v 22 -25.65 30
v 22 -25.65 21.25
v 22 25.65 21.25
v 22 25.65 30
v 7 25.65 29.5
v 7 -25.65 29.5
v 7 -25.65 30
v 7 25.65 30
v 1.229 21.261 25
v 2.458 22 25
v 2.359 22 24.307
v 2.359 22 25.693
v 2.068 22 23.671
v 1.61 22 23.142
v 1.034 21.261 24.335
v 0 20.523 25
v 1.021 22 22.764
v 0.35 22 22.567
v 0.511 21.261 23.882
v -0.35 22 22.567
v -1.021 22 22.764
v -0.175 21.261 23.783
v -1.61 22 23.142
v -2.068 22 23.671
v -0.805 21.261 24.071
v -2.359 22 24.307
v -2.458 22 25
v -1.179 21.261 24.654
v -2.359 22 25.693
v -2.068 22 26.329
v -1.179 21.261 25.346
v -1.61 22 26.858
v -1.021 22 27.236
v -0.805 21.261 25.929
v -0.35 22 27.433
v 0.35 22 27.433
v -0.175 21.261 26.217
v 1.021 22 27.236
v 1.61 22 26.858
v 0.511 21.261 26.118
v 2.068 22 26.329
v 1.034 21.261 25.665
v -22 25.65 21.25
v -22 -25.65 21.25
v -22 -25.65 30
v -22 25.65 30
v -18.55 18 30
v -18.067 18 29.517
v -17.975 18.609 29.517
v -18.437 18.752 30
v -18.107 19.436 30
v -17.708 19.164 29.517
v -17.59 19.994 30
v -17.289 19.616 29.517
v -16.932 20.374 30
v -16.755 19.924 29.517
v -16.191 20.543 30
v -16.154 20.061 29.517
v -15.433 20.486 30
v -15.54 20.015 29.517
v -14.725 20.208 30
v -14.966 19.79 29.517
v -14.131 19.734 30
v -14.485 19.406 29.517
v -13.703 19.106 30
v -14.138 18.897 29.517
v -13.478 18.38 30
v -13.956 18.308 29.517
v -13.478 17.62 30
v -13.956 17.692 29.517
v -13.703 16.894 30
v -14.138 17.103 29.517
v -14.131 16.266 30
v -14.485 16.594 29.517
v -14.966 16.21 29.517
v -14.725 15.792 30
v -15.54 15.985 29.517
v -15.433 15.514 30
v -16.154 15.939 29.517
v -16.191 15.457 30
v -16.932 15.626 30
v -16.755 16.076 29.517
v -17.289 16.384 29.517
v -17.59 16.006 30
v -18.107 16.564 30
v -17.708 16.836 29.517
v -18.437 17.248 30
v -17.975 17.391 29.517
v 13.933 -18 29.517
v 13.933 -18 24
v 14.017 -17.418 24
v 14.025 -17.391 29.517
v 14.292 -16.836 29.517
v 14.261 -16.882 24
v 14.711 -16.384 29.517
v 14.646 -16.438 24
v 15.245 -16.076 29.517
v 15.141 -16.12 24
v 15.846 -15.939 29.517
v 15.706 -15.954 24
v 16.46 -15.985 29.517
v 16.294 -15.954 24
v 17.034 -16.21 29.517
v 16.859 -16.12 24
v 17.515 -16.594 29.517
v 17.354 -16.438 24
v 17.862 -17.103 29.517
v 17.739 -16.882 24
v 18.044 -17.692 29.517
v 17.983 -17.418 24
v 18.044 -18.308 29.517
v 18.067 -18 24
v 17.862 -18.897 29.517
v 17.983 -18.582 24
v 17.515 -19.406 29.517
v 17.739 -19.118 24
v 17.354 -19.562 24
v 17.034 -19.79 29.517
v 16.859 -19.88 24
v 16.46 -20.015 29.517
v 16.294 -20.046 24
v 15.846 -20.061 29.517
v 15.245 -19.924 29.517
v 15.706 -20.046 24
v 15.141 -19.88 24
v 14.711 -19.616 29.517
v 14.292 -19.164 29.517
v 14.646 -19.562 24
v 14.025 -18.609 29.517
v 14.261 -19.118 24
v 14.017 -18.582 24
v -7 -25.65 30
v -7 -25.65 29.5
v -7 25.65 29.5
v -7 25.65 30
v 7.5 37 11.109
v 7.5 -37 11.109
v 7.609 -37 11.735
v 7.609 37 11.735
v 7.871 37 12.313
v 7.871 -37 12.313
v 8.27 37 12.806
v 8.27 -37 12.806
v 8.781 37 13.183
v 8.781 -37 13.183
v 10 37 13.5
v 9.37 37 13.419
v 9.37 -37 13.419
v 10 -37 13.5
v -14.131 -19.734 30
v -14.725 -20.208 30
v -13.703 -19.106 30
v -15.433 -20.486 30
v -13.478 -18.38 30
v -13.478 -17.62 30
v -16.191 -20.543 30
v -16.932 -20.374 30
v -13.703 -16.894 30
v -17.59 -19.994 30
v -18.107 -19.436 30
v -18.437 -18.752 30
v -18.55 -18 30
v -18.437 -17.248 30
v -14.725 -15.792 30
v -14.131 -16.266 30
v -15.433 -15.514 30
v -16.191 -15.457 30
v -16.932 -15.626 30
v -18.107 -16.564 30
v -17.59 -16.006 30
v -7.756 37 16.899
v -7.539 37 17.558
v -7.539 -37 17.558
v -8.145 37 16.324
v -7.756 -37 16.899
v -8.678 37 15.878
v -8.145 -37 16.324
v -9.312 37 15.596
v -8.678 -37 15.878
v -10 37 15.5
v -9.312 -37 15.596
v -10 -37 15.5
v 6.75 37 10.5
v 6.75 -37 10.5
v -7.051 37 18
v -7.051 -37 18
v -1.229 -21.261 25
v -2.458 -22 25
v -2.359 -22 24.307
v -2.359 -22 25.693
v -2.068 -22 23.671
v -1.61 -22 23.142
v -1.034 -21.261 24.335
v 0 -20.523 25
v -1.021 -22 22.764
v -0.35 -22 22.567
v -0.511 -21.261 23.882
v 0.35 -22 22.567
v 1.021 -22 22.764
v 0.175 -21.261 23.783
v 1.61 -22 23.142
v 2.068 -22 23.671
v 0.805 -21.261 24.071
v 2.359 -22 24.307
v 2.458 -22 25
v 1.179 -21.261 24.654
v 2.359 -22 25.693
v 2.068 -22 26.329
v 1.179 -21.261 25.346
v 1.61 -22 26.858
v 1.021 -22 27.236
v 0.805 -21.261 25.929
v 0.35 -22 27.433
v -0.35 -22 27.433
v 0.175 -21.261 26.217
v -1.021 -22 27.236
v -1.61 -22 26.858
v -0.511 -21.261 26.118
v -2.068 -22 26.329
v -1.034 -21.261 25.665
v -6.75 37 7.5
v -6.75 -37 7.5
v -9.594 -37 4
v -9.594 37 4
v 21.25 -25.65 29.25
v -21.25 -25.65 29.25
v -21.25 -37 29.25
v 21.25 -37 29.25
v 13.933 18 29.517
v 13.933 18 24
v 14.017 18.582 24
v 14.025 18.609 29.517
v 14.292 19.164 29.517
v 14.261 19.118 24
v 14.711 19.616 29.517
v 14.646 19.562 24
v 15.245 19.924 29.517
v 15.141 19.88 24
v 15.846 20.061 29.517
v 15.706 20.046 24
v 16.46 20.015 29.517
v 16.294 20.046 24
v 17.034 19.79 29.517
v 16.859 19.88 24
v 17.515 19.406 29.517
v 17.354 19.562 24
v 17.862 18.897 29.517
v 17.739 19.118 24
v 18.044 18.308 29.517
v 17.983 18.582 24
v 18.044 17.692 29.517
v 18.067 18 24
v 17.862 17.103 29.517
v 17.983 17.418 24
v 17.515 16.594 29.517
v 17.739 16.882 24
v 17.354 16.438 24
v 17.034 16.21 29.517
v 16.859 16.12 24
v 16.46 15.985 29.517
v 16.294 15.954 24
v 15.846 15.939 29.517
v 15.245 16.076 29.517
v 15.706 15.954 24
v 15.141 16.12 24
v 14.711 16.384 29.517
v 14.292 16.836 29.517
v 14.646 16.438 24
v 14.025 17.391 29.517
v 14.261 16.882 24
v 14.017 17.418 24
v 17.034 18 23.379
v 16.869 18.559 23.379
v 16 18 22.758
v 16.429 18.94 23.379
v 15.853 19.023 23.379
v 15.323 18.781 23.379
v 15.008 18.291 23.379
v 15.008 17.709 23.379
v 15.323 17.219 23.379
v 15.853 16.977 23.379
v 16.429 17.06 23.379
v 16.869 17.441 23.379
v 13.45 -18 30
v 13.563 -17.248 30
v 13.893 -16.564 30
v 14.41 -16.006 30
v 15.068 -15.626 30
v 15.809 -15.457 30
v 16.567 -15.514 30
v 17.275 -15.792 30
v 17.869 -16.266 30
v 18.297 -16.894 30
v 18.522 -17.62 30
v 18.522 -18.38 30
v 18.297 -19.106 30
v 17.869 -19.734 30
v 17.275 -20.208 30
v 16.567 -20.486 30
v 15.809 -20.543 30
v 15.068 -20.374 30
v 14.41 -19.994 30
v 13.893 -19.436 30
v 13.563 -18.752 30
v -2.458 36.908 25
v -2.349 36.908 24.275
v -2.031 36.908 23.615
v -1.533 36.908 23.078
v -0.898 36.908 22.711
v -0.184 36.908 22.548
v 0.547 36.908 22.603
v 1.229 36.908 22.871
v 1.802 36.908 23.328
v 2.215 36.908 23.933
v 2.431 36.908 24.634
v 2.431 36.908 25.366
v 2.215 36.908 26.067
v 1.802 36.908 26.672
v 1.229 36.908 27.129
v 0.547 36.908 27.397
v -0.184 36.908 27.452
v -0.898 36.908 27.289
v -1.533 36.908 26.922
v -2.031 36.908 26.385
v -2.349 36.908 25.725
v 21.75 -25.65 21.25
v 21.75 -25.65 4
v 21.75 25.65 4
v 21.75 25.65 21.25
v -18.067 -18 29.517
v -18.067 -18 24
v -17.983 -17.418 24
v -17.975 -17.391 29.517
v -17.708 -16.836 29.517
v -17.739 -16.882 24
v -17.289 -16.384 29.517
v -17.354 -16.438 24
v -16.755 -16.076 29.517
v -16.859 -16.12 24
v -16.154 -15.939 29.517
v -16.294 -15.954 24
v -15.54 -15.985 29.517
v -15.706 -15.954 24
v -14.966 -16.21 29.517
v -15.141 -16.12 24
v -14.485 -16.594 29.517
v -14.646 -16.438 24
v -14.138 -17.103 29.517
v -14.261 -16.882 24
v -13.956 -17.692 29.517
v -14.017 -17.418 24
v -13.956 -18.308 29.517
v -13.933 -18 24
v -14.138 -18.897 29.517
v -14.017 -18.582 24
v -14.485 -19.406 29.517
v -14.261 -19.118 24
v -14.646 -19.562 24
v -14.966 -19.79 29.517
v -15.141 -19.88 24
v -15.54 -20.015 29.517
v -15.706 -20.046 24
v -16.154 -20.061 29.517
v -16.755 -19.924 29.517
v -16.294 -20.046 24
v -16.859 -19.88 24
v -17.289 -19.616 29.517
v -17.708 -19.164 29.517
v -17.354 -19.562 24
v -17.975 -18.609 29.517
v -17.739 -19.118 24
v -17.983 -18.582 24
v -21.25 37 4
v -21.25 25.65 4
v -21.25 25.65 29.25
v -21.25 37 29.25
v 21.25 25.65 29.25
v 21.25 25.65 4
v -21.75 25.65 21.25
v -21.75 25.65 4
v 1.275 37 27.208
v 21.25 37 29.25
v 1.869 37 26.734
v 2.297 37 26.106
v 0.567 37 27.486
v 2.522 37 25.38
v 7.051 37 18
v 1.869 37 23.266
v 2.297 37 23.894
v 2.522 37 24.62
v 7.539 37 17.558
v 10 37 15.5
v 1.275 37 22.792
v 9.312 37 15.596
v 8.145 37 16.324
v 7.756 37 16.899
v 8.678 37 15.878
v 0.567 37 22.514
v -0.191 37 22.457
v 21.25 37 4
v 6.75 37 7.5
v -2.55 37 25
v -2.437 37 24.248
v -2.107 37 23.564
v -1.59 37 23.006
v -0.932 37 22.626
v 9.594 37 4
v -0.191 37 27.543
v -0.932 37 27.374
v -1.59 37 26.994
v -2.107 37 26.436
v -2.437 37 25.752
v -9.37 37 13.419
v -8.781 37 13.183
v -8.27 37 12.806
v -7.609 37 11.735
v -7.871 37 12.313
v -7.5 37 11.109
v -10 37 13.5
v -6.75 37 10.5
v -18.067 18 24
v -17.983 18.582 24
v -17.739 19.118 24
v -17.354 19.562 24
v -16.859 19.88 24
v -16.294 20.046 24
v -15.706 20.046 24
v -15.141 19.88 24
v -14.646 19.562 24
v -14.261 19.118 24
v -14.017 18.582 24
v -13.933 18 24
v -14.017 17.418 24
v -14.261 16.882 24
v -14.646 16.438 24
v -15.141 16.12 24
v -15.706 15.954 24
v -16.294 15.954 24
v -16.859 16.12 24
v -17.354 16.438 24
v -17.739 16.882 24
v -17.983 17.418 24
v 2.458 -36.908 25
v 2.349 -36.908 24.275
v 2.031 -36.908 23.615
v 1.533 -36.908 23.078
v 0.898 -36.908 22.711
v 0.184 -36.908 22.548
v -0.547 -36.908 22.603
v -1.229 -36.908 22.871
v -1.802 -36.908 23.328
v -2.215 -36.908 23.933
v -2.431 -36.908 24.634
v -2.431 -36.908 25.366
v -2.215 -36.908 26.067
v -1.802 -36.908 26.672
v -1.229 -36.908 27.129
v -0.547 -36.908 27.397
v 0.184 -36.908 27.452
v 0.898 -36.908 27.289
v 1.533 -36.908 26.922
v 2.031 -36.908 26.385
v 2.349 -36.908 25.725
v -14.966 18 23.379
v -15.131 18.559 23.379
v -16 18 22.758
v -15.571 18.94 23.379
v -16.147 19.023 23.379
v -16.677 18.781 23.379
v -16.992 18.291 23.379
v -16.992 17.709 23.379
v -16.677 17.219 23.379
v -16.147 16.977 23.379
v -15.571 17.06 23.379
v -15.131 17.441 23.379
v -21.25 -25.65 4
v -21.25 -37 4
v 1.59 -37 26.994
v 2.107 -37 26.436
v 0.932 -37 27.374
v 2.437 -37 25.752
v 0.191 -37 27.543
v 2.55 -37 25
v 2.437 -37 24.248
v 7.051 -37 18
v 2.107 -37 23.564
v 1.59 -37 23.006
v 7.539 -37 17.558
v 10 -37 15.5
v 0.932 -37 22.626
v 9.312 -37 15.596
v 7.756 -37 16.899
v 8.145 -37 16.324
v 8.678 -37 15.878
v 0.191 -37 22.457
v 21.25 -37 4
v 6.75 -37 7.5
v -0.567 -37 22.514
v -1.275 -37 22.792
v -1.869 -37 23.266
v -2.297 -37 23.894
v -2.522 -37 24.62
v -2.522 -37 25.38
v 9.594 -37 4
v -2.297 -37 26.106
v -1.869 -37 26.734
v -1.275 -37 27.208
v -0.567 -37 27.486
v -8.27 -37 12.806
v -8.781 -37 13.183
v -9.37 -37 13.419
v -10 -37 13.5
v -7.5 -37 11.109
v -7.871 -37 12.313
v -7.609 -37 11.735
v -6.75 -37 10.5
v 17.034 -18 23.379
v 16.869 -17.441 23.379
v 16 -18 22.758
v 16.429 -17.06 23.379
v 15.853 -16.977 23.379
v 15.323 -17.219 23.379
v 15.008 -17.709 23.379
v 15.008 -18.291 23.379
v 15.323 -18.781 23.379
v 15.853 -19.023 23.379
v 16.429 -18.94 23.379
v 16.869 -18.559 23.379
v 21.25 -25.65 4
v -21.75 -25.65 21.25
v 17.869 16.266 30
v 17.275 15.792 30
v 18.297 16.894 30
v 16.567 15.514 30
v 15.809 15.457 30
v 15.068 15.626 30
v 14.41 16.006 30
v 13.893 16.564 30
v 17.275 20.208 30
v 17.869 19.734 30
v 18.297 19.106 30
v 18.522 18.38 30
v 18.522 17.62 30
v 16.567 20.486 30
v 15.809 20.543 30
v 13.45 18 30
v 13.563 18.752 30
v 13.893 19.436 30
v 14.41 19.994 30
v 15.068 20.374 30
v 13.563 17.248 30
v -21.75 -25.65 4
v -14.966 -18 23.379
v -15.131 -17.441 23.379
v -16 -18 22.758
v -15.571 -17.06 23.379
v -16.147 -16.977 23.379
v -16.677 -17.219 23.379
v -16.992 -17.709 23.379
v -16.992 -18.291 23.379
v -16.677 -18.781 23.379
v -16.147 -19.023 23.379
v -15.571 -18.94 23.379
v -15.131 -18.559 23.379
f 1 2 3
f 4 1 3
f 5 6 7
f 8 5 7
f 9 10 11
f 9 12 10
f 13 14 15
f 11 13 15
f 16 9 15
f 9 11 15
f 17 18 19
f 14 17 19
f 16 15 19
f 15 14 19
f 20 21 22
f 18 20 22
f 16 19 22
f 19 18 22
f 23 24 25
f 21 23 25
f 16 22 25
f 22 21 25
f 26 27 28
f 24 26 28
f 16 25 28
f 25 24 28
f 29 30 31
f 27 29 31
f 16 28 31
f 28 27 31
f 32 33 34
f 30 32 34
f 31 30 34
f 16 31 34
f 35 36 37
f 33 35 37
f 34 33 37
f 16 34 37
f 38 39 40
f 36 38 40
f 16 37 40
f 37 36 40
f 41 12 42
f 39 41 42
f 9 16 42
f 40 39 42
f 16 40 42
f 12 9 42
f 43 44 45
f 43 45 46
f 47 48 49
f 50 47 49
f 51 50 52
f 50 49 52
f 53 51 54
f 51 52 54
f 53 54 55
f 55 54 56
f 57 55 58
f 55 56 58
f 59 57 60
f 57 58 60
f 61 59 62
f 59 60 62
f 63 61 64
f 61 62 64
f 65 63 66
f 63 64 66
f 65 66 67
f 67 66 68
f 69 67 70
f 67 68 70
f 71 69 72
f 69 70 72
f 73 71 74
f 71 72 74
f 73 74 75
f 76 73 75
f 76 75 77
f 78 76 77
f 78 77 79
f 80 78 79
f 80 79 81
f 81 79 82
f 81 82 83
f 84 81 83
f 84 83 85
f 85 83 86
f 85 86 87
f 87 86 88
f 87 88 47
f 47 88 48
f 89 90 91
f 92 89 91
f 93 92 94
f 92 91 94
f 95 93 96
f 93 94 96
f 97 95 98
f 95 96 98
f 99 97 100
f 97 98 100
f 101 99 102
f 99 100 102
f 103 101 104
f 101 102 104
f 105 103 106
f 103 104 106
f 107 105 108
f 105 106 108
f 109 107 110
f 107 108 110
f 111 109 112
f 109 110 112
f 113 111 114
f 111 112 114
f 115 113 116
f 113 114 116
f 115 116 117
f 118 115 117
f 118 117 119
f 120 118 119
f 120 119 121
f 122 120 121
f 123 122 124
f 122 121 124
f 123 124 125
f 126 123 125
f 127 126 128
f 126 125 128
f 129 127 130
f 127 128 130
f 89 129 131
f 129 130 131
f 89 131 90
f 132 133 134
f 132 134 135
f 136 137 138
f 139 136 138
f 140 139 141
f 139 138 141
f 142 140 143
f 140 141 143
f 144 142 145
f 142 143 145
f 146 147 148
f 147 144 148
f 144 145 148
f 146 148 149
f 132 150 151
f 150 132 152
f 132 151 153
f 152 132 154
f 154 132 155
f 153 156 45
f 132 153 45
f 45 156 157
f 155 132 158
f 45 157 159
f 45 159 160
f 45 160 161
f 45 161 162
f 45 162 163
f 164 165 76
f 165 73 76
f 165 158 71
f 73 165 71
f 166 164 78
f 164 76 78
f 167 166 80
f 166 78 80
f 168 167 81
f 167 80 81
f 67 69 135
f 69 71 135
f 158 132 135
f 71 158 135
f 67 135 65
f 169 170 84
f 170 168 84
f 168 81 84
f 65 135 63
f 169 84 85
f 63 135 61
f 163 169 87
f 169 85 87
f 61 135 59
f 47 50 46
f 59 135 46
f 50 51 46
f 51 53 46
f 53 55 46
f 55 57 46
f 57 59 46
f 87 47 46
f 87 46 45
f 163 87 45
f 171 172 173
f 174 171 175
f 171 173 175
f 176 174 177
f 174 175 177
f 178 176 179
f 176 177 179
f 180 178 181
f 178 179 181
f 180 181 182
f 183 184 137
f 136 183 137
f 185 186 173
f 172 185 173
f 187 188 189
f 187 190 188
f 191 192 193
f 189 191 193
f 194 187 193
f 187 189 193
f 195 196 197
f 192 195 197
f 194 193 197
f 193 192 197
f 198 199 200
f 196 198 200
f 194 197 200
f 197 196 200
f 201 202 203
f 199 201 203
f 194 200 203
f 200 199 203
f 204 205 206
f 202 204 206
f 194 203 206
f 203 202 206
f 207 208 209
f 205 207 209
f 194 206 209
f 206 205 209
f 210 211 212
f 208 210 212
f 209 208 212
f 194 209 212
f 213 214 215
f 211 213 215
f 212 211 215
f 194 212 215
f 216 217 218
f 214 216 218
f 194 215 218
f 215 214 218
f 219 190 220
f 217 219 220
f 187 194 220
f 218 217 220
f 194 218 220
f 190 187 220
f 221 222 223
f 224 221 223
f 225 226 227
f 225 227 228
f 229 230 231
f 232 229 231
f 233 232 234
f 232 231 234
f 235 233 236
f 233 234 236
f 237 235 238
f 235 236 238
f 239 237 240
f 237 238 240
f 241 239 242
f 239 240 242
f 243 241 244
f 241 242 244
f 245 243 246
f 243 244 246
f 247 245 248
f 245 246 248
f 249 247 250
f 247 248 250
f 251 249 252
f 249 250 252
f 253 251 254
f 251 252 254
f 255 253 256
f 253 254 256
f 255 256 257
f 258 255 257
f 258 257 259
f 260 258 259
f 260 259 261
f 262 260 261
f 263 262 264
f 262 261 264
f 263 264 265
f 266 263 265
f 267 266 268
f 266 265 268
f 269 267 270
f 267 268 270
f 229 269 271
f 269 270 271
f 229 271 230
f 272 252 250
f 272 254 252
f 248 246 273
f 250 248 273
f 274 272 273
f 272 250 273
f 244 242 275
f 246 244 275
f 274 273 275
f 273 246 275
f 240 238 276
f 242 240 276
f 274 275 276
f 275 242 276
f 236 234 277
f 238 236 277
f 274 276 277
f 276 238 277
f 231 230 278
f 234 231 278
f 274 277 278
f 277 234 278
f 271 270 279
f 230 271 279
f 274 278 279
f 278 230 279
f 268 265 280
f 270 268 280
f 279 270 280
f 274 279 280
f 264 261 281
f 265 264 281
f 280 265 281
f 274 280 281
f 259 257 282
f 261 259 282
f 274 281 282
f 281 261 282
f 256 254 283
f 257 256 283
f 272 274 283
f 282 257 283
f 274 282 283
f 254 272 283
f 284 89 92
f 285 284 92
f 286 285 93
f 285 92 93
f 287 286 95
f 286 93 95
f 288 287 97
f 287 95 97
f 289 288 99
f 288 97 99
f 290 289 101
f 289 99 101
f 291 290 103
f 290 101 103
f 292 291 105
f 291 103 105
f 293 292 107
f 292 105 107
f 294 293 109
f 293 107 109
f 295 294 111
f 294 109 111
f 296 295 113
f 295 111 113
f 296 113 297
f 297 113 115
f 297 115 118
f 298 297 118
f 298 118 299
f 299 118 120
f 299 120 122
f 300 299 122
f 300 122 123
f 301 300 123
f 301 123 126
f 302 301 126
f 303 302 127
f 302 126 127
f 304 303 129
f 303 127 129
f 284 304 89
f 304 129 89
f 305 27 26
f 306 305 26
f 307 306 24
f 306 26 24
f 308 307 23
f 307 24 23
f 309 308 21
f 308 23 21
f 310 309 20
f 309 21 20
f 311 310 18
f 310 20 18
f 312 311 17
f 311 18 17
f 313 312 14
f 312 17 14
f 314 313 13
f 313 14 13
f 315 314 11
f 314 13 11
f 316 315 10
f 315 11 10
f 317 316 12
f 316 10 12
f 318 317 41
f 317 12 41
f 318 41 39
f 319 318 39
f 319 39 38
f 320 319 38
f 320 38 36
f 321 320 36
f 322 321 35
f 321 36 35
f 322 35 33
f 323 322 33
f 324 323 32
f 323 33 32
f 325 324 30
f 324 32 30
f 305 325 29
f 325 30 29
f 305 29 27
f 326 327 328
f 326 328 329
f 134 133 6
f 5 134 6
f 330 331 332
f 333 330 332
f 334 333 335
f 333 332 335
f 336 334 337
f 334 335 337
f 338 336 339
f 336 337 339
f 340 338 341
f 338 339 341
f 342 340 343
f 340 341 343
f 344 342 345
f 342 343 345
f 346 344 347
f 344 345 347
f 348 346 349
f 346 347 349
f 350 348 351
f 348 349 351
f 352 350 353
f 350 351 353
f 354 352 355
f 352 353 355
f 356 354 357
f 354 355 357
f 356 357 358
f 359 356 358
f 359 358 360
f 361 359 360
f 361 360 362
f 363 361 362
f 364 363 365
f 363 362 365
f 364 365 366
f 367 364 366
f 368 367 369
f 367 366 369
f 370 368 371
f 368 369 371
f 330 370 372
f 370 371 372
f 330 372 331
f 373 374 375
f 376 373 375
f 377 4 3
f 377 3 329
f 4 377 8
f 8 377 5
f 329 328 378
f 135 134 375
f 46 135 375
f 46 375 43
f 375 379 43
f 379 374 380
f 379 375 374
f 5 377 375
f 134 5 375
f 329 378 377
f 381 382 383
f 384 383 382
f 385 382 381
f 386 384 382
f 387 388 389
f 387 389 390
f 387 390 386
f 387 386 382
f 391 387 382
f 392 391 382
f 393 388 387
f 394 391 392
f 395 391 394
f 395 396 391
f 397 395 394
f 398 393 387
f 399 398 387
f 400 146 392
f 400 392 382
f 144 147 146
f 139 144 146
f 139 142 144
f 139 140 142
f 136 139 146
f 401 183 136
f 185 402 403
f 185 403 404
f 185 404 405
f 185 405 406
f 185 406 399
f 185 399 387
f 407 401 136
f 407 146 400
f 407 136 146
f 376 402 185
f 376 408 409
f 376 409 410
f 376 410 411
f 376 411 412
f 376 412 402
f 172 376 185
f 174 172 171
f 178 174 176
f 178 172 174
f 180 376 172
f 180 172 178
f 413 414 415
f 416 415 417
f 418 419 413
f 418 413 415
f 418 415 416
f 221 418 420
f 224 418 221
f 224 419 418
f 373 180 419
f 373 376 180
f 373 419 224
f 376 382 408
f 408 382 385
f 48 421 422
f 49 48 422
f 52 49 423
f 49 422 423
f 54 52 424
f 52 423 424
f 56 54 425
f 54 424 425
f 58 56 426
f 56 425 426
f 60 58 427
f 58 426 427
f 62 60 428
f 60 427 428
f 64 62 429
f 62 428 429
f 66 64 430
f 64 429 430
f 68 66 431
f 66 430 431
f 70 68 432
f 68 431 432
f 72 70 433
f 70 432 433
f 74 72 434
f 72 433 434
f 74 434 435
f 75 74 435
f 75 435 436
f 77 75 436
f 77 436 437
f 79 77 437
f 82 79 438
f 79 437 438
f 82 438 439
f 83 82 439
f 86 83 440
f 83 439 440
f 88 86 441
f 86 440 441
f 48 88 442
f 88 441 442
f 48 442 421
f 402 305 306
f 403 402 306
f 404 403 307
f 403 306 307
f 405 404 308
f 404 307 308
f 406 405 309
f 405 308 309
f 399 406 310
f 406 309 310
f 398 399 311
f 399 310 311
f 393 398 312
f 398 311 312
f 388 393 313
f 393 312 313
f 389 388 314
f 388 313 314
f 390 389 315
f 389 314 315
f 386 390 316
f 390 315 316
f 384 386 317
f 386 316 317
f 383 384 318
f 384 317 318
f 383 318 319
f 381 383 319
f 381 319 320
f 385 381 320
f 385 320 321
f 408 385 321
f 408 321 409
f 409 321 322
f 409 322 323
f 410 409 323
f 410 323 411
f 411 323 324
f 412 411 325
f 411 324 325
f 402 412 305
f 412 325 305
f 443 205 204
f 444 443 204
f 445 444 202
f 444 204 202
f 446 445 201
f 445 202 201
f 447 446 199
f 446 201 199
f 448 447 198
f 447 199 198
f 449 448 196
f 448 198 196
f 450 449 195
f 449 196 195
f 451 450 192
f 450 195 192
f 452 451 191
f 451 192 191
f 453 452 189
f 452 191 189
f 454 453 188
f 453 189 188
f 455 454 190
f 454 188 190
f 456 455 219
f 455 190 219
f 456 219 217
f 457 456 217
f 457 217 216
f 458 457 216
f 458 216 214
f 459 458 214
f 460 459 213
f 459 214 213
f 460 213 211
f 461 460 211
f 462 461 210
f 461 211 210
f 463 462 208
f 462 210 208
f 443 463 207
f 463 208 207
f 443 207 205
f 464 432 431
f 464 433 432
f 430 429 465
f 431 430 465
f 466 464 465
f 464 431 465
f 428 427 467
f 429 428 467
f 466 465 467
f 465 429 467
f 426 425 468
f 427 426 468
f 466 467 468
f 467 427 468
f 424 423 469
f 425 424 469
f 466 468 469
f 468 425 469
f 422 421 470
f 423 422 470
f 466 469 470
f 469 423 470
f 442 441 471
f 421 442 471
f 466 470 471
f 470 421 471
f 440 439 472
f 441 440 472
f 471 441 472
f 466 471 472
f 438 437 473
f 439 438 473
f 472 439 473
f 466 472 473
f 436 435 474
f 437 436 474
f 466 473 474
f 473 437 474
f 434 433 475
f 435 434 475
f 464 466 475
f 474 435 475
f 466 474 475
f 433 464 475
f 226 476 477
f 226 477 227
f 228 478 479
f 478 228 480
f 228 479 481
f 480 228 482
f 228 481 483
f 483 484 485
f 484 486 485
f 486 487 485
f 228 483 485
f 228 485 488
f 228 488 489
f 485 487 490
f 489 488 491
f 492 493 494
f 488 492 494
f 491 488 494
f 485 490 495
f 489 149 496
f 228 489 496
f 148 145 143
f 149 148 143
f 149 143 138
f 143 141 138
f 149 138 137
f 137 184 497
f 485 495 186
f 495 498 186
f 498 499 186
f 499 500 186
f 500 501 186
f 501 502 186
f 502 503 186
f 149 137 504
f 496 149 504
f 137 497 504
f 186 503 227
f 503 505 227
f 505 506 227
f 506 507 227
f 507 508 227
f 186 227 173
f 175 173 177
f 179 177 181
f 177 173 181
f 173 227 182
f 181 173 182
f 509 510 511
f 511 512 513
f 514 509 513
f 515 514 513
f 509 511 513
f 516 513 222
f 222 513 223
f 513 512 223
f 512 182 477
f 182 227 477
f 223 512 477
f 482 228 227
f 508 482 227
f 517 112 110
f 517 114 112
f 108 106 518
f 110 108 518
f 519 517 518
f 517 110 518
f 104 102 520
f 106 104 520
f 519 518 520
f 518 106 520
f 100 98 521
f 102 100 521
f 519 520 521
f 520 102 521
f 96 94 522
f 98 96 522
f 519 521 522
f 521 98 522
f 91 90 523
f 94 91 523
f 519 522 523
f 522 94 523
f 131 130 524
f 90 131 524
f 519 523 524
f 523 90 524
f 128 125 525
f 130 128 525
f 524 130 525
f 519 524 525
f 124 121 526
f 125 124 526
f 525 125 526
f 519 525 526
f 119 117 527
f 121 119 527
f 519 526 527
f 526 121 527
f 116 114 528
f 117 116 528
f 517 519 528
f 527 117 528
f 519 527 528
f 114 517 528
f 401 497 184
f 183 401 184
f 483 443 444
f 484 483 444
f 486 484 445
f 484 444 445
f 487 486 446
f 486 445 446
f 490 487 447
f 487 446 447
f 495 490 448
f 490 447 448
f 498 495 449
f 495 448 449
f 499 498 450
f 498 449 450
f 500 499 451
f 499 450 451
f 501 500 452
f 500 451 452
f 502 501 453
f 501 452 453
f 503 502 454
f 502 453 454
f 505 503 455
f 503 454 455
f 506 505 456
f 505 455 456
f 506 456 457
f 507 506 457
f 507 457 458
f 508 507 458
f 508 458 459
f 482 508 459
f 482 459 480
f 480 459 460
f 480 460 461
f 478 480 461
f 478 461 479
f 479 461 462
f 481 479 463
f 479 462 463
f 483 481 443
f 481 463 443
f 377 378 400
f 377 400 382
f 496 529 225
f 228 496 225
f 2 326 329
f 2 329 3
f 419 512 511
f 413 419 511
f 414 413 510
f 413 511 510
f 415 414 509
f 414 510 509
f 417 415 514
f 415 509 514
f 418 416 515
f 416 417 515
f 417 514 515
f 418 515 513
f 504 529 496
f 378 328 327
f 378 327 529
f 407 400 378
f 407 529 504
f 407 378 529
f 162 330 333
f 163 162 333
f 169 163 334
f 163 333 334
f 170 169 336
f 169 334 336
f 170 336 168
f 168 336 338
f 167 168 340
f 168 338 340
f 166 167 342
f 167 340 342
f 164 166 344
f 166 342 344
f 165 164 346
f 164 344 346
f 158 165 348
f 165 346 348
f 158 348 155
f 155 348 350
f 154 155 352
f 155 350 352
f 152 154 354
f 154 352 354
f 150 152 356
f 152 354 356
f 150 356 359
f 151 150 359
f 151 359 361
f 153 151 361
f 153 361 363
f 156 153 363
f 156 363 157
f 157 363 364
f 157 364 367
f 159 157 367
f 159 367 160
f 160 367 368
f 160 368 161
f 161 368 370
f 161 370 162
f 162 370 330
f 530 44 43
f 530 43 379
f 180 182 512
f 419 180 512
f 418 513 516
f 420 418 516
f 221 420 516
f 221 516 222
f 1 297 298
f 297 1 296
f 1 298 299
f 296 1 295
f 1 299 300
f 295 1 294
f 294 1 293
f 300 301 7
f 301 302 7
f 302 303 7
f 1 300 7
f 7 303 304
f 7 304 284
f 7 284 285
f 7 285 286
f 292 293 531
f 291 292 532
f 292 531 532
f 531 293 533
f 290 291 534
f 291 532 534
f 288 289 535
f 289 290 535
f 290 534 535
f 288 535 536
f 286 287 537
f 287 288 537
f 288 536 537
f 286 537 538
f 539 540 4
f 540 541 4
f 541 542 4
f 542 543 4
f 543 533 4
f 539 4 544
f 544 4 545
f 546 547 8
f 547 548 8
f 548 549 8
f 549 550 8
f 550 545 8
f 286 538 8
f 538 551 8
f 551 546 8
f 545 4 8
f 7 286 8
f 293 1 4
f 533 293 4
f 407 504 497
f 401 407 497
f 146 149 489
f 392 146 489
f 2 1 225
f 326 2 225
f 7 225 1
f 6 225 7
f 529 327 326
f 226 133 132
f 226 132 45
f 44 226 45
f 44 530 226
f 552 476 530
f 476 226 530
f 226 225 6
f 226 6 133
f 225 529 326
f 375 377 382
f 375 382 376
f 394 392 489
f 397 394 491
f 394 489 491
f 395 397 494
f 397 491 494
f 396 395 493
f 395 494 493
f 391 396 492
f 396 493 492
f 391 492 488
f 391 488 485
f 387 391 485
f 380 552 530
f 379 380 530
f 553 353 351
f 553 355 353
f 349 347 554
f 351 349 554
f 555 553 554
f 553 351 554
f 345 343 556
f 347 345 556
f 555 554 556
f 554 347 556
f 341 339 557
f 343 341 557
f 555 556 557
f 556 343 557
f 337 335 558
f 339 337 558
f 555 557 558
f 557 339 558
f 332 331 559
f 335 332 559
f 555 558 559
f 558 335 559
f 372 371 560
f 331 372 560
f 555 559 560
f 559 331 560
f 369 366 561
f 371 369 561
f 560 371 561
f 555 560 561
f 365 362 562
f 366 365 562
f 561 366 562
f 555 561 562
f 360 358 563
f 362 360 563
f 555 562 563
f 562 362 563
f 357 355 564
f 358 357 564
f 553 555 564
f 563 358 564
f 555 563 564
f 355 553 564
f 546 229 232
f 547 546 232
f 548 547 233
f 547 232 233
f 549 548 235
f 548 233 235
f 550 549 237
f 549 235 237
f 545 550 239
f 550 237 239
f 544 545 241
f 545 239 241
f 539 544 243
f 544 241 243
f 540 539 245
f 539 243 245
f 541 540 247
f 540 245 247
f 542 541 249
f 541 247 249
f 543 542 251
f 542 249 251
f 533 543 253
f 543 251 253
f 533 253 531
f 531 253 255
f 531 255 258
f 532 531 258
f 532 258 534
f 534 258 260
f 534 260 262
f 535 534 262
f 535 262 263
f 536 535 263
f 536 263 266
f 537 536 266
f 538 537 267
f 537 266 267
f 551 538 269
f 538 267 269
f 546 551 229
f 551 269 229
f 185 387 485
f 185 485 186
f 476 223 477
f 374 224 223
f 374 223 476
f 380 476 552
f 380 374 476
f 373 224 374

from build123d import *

# Parameters (mm, degrees)
SKIZZE1_W                       = 44
SKIZZE1_H                       = 51.3
AUFSATZ_LINEAR_AUSTRAGEN1_DEPTH = 26
SKIZZE2_W                       = 0.25
SKIZZE2_H                       = 17.25
SCHNITT_LINEAR_AUSTRAGEN1_DEPTH = 64.369472146
SKIZZE3_W                       = 14
SKIZZE3_H                       = 0.5
SCHNITT_LINEAR_AUSTRAGEN2_DEPTH = 64.369472146
SKIZZE4_W                       = 0.25
SKIZZE4_H                       = 17.25
SCHNITT_LINEAR_AUSTRAGEN3_DEPTH = 51.3
SKIZZE5_W                       = 42.5
SKIZZE5_H                       = 25.25
AUFSATZ_LINEAR_AUSTRAGEN2_DEPTH = 11.35
SKIZZE6_W                       = 42.5
SKIZZE6_H                       = 25.25
AUFSATZ_LINEAR_AUSTRAGEN3_DEPTH = 11.35
SCHNITT_LINEAR_AUSTRAGEN4_DEPTH = 83.825116963
BOHRUNG1_D                      = 4.917
BOHRUNG1_DEPTH                  = 15
BOHRUNG1_TIP                    = 1.477215832
BOHRUNG2_D                      = 4.917
BOHRUNG2_DEPTH                  = 15
BOHRUNG2_TIP                    = 1.477215832
DURCHGANGSLOCH_F_R_M3_51_D      = 4.134
DURCHGANGSLOCH_F_R_M3_51_DEPTH  = 6
DURCHGANGSLOCH_F_R_M3_51_TIP    = 1.2419789
FASE1_SIZE                      = 0.483
FASE2_SIZE                      = 0.448979592
FASE3_SIZE                      = 0.0915
FASE4_SIZE                      = 0.448979592


with BuildPart() as part:
    # Skizze1 → Aufsatz-Linear austragen1 (new body)
    with BuildSketch(Plane(origin=(0, 0, 4), x_dir=(-1, 0, 0), z_dir=(0, 0, -1))):
        Rectangle(SKIZZE1_W, SKIZZE1_H)
    extrude(amount=-AUFSATZ_LINEAR_AUSTRAGEN1_DEPTH)

    # Skizze2 → Schnitt-Linear austragen1 (cut, through all)
    with BuildSketch(Plane.XZ.offset(25.65)):
        with Locations((-21.875, 12.625)):
            Rectangle(SKIZZE2_W, SKIZZE2_H)
    extrude(amount=-SCHNITT_LINEAR_AUSTRAGEN1_DEPTH, mode=Mode.SUBTRACT)

    # Skizze3 → Schnitt-Linear austragen2 (cut, through all)
    with BuildSketch(Plane.XZ.offset(25.65)):
        with Locations((0, 29.75)):
            Rectangle(SKIZZE3_W, SKIZZE3_H)
    extrude(amount=-SCHNITT_LINEAR_AUSTRAGEN2_DEPTH, mode=Mode.SUBTRACT)

    # Skizze4 → Schnitt-Linear austragen3 (cut)
    with BuildSketch(Plane.XZ.offset(25.65)):
        with Locations((21.875, 12.625)):
            Rectangle(SKIZZE4_W, SKIZZE4_H)
    extrude(amount=-SCHNITT_LINEAR_AUSTRAGEN3_DEPTH, mode=Mode.SUBTRACT)

    # Skizze5 → Aufsatz-Linear austragen2 (add)
    with BuildSketch(Plane(origin=(0, 25.65, 0), x_dir=(-1, 0, 0), z_dir=(0, 1, 0))):
        with Locations((0, 16.625)):
            Rectangle(SKIZZE5_W, SKIZZE5_H)
    extrude(amount=AUFSATZ_LINEAR_AUSTRAGEN2_DEPTH)

    # Skizze6 → Aufsatz-Linear austragen3 (add)
    with BuildSketch(Plane.XZ.offset(25.65)):
        with Locations((0, 16.625)):
            Rectangle(SKIZZE6_W, SKIZZE6_H)
    extrude(amount=AUFSATZ_LINEAR_AUSTRAGEN3_DEPTH)

    # Skizze7 → Schnitt-Linear austragen4 (cut, through all)
    with BuildSketch(Plane.XZ.offset(37)):
        with BuildLine():
            Line((-9.59375, 4), (9.59375, 4))
            Line((9.59375, 4), (6.75, 7.5))
            Line((6.75, 7.5), (6.75, 10.5))
            Line((6.75, 10.5), (7.5, 11.109375))
            ThreePointArc((7.5, 11.109375), (8.270470592, 12.806156162), (10, 13.5))
            Line((10, 13.5), (10, 15.5))
            ThreePointArc((10, 15.5), (8.232233047, 16.232233047), (7.5, 18))
            Line((7.5, 18), (-7.5, 18))
            ThreePointArc((-7.5, 18), (-8.232233047, 16.232233047), (-10, 15.5))
            Line((-10, 15.5), (-10, 13.5))
            ThreePointArc((-10, 13.5), (-8.270470592, 12.806156162), (-7.5, 11.109375))
            Line((-7.5, 11.109375), (-6.75, 10.5))
            Line((-6.75, 10.5), (-6.75, 7.5))
            Line((-6.75, 7.5), (-9.59375, 4))
        make_face()
    extrude(amount=-SCHNITT_LINEAR_AUSTRAGEN4_DEPTH, mode=Mode.SUBTRACT)

    # Bohrung1
    with Locations(Plane(origin=(0, -37, 0), x_dir=(-1, 0, 0), z_dir=(0, -1, 0))):
        with Locations((0, -25)):
            Hole(BOHRUNG1_D / 2, depth=BOHRUNG1_DEPTH)
            with Locations((0, 0, -(BOHRUNG1_DEPTH + BOHRUNG1_TIP / 2))):  # 118° drill point
                Cone(0, BOHRUNG1_D / 2, BOHRUNG1_TIP, mode=Mode.SUBTRACT)

    # Bohrung2
    with Locations(Plane(origin=(0, 37, 0), x_dir=(1, 0, 0), z_dir=(0, 1, 0))):
        with Locations((0, -25)):
            Hole(BOHRUNG2_D / 2, depth=BOHRUNG2_DEPTH)
            with Locations((0, 0, -(BOHRUNG2_DEPTH + BOHRUNG2_TIP / 2))):  # 118° drill point
                Cone(0, BOHRUNG2_D / 2, BOHRUNG2_TIP, mode=Mode.SUBTRACT)

    # Durchgangsloch für M3.51
    with Locations(Plane.XY.offset(30)):
        with Locations((16, -18), (16, 18), (-16, 18), (-16, -18)):
            Hole(DURCHGANGSLOCH_F_R_M3_51_D / 2, depth=DURCHGANGSLOCH_F_R_M3_51_DEPTH)
            with Locations((0, 0, -(DURCHGANGSLOCH_F_R_M3_51_DEPTH + DURCHGANGSLOCH_F_R_M3_51_TIP / 2))):  # 118° drill point
                Cone(0, DURCHGANGSLOCH_F_R_M3_51_D / 2, DURCHGANGSLOCH_F_R_M3_51_TIP, mode=Mode.SUBTRACT)

    # Fase1
    fase1_edges = [part.edges().sort_by_distance(p)[0] for p in [
        (-13.933, -18, 30),
        (-13.933, 18, 30),
        (18.067, 18, 30),
        (18.067, -18, 30),
    ]]
    chamfer(fase1_edges, length=FASE1_SIZE)

    # Fase2
    # the kernel refuses this chamfer: 0.448979592, 0.406117321 mm, written as the material it adds along each edge
    with BuildSketch(Plane(origin=(-7.5, -37, 18), x_dir=(1, 0, 0), z_dir=(0, 1, 0))) as fase2_piece_1:
        with BuildLine():
            Line((FASE2_SIZE, 0), (-0.03932739, 0.441690284))
            ThreePointArc((-0.03932739, 0.441690284), (-0.010448273, 0.22832477), (0, 0))
            Line((0, 0), (FASE2_SIZE, 0))
        make_face()
    extrude(amount=74)

    # Fase3
    fase3_edges = [part.edges().sort_by_distance(p)[0] for p in [
        (-2.4585, -37, 25),
        (2.4585, 37, 25),
    ]]
    chamfer(fase3_edges, length=FASE3_SIZE)

    # Fase4
    # the kernel refuses this chamfer: 0.448979592, 0.406117321 mm, written as the material it adds along each edge
    with BuildSketch(Plane(origin=(7.5, -37, 18), x_dir=(0.08868753028202897, 0, -0.9960594972050988), z_dir=(0, 1, 0))) as fase4_piece_1:
        with BuildLine():
            Line((0.443437651, 0), (-FASE4_SIZE * 0.0886875302498, FASE4_SIZE * 0.996059496843))
            Line((-FASE4_SIZE * 0.0886875302498, FASE4_SIZE * 0.996059496843), (0, 0))
            ThreePointArc((0, 0), (0.228351687, 0.009842458), (0.443437651, 0))
        make_face()
    extrude(amount=74)


solid = part.part
